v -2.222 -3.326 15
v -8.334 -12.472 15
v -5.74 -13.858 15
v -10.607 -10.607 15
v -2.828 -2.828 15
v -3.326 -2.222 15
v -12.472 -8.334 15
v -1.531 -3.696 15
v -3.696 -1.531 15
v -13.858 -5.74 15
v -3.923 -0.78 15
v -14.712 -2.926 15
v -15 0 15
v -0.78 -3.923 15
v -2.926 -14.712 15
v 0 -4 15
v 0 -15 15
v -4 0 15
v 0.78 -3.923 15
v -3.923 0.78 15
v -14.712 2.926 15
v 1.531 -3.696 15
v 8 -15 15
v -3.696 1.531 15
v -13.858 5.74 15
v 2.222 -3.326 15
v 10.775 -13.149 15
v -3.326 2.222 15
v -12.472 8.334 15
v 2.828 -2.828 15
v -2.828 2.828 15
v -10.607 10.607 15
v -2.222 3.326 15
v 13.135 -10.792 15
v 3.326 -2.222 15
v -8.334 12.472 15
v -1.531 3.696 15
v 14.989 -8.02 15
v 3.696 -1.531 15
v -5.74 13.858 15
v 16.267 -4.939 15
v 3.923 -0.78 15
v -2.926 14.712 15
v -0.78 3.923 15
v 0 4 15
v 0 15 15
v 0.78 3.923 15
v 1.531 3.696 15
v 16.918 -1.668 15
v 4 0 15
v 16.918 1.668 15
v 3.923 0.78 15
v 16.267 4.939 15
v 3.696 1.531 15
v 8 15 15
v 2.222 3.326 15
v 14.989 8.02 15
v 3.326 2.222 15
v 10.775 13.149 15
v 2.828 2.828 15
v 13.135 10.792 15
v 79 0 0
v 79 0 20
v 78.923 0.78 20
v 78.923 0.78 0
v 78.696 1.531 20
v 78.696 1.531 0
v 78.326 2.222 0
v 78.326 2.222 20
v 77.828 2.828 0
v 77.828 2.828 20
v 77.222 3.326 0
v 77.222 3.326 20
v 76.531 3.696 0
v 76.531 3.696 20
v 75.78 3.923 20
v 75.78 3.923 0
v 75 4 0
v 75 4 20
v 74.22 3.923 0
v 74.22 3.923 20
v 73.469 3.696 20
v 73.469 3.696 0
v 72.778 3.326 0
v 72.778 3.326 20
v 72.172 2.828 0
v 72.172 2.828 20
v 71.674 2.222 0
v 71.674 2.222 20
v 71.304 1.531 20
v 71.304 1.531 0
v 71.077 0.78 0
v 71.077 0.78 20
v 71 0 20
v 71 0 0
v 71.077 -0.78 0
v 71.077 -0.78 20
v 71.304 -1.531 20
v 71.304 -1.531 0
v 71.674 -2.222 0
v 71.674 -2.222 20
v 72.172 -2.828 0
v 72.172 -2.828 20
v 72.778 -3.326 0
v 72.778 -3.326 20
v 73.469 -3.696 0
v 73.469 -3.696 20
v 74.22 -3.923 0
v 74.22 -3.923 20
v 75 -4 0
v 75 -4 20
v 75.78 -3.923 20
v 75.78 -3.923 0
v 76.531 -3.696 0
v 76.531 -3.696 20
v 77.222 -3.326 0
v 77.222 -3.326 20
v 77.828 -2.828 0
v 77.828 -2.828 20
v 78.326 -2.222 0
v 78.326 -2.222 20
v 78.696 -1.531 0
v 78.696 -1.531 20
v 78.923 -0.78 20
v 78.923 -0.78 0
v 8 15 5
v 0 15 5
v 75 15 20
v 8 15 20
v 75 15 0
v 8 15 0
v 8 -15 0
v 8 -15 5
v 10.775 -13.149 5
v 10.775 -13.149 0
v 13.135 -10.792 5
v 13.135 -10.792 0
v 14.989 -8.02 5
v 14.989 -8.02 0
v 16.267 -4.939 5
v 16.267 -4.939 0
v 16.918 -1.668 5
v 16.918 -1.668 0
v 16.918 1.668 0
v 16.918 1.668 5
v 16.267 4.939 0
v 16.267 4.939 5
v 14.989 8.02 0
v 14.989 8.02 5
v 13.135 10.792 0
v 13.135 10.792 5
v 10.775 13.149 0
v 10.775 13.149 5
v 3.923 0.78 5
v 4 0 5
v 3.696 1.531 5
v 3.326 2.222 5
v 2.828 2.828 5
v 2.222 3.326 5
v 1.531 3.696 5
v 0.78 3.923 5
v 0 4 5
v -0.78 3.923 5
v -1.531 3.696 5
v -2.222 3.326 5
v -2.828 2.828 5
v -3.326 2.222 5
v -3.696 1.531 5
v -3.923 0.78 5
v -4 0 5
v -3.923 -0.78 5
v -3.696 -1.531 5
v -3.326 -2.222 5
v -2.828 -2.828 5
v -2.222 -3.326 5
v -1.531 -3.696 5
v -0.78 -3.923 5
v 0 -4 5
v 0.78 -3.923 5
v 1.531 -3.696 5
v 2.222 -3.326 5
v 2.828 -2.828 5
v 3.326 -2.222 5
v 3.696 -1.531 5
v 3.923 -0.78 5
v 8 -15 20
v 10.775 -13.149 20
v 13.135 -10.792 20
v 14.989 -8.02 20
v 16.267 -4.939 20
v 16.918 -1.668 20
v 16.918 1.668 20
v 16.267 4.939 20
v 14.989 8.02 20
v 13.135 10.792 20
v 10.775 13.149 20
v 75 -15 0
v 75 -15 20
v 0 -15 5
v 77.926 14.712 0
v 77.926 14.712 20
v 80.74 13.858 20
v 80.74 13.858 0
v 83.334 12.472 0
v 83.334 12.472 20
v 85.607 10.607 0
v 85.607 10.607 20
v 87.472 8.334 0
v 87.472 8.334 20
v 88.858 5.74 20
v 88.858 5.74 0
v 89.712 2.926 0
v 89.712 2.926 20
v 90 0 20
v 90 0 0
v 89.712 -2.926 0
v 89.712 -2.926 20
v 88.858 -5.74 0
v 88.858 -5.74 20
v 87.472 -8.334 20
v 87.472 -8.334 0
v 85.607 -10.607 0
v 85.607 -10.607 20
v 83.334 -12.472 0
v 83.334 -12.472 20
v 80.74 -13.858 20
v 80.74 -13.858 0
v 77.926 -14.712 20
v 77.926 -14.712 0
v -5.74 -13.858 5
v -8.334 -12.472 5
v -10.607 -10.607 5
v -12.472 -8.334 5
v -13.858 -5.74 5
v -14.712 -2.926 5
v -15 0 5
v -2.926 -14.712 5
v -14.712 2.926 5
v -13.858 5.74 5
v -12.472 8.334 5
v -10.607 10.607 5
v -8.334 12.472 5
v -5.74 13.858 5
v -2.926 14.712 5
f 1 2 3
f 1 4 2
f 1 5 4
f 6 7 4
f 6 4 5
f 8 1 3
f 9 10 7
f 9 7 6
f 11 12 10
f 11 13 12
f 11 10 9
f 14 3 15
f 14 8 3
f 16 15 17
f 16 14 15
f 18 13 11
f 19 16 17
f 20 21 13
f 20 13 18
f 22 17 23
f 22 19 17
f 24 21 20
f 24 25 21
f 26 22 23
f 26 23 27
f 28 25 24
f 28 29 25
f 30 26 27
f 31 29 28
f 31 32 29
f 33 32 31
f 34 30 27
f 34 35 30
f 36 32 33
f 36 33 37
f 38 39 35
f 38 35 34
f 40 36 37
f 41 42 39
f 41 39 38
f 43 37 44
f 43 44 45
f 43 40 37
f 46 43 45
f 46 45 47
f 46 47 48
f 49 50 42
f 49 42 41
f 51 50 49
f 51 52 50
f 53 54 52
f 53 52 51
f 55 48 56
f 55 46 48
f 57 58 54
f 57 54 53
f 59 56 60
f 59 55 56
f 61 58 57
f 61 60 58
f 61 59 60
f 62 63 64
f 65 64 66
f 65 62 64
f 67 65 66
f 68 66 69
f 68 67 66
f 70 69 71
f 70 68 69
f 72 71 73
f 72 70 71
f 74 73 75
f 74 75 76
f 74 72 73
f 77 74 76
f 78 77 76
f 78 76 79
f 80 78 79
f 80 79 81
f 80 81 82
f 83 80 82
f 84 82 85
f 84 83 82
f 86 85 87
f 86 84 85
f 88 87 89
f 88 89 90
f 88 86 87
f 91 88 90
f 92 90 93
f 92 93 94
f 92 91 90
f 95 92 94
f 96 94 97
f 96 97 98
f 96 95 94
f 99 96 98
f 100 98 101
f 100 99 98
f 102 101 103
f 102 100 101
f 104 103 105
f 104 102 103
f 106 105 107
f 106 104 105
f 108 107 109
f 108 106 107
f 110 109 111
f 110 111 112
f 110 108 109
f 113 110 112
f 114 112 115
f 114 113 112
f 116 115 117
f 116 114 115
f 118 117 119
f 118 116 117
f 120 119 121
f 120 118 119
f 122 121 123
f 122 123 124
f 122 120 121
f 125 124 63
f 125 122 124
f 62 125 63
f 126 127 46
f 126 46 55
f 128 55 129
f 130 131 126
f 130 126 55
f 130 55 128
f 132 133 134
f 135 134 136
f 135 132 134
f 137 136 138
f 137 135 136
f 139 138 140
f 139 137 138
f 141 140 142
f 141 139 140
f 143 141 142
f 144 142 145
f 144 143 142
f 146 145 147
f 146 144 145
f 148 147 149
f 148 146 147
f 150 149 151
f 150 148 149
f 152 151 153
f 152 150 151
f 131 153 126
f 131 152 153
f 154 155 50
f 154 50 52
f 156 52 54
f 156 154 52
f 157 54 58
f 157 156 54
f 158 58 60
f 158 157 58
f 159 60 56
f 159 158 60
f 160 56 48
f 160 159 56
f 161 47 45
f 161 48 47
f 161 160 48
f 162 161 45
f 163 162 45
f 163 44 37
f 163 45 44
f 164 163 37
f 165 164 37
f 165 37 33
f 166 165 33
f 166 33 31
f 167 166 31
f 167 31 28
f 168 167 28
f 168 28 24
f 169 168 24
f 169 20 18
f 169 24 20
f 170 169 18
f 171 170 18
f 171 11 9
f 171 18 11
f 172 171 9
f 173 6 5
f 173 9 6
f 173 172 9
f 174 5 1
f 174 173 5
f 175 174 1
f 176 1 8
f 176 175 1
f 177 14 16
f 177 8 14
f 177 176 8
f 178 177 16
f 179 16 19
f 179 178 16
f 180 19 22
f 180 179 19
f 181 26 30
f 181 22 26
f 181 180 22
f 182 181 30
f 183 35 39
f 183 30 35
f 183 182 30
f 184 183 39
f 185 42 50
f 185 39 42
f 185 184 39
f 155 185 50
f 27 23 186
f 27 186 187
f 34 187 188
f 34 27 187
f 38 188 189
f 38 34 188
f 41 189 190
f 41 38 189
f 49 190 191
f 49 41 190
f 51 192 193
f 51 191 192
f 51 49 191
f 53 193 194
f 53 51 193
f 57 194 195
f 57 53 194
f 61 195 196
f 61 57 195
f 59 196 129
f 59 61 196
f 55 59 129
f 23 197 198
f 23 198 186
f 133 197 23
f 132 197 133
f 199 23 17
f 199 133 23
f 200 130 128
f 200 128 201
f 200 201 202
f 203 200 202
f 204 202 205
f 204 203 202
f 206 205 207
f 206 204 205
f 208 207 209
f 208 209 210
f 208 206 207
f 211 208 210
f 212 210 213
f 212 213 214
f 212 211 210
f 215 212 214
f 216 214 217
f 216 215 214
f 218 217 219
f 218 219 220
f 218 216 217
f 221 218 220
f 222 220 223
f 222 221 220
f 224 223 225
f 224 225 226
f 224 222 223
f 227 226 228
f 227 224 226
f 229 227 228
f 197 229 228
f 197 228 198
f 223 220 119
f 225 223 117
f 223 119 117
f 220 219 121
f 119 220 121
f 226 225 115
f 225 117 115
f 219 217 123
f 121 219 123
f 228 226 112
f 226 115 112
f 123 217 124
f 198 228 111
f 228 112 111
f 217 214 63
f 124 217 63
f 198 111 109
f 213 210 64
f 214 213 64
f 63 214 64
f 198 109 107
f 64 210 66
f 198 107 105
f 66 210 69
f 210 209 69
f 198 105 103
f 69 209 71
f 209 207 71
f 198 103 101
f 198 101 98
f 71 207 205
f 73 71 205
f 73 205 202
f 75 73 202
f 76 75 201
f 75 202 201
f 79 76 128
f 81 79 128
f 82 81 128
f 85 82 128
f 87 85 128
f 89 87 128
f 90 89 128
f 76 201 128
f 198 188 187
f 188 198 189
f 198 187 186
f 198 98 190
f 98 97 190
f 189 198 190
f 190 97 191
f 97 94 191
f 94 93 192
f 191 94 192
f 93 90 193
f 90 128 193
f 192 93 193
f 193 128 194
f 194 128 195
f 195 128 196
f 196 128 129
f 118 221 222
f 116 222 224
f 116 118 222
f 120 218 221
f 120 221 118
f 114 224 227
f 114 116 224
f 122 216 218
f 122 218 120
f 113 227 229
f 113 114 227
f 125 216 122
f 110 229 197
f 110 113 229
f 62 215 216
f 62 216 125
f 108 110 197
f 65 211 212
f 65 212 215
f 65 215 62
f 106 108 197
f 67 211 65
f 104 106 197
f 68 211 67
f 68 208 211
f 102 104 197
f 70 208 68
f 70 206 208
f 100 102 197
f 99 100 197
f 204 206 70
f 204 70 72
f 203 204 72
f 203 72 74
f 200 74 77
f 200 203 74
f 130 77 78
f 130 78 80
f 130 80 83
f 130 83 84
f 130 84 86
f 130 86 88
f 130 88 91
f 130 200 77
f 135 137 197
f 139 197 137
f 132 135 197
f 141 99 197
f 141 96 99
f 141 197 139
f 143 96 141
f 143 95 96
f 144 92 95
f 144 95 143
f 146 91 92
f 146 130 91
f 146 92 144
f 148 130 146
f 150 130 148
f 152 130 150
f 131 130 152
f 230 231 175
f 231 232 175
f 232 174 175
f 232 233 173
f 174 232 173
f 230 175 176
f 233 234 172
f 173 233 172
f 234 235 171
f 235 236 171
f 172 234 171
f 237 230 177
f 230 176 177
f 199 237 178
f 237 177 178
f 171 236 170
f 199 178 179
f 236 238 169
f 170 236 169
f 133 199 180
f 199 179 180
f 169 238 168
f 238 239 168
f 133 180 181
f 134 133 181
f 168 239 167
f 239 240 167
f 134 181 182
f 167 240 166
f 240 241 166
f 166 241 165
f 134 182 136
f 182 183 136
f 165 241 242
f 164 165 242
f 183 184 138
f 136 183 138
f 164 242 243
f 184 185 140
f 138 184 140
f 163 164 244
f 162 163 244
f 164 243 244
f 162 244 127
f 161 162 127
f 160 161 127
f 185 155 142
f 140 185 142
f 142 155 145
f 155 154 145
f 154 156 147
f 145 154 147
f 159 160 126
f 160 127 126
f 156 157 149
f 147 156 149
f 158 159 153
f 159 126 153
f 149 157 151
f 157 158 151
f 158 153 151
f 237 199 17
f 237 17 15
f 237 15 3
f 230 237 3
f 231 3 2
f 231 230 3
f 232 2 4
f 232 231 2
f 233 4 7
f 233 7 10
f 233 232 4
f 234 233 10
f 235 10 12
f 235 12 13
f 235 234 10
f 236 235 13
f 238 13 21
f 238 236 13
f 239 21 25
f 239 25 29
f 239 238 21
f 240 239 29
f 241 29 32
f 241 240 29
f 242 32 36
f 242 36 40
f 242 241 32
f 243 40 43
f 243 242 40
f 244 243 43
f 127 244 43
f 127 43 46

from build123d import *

# Parameters (mm, degrees)
SKETCH_1_R          = 4
EXTRUDE_1_DEPTH     = 20
SKETCH_2_R          = 17
CUT_EXTRUDE_1_DEPTH = 5
CUT_EXTRUDE_START   = 15
SKETCH_2_2_R        = 17
CUT_EXTRUDE_2_DEPTH = 5


with BuildPart() as part:
    # 草图1 → 凸台-拉伸1 (new body)
    with BuildSketch(Plane.XY):
        with BuildLine():
            Line((0, 15), (75, 15))
            ThreePointArc((75, 15), (90, 0), (75, -15))
            Line((75, -15), (0, -15))
            ThreePointArc((0, -15), (-15, 0), (0, 15))
        make_face()
        Circle(SKETCH_1_R, mode=Mode.SUBTRACT)
        with Locations((75, 0)):
            Circle(SKETCH_1_R, mode=Mode.SUBTRACT)
    extrude(amount=EXTRUDE_1_DEPTH)

    # 草图2 → 切除-拉伸1 (cut)
    with BuildSketch(Plane.XY):
        Circle(SKETCH_2_R)
    extrude(amount=CUT_EXTRUDE_1_DEPTH, mode=Mode.SUBTRACT)

    # 草图2<2> → 切除-拉伸2 (cut)
    with BuildSketch(Plane.XY.offset(CUT_EXTRUDE_START)):
        Circle(SKETCH_2_2_R)
    extrude(amount=CUT_EXTRUDE_2_DEPTH, mode=Mode.SUBTRACT)


solid = part.part
